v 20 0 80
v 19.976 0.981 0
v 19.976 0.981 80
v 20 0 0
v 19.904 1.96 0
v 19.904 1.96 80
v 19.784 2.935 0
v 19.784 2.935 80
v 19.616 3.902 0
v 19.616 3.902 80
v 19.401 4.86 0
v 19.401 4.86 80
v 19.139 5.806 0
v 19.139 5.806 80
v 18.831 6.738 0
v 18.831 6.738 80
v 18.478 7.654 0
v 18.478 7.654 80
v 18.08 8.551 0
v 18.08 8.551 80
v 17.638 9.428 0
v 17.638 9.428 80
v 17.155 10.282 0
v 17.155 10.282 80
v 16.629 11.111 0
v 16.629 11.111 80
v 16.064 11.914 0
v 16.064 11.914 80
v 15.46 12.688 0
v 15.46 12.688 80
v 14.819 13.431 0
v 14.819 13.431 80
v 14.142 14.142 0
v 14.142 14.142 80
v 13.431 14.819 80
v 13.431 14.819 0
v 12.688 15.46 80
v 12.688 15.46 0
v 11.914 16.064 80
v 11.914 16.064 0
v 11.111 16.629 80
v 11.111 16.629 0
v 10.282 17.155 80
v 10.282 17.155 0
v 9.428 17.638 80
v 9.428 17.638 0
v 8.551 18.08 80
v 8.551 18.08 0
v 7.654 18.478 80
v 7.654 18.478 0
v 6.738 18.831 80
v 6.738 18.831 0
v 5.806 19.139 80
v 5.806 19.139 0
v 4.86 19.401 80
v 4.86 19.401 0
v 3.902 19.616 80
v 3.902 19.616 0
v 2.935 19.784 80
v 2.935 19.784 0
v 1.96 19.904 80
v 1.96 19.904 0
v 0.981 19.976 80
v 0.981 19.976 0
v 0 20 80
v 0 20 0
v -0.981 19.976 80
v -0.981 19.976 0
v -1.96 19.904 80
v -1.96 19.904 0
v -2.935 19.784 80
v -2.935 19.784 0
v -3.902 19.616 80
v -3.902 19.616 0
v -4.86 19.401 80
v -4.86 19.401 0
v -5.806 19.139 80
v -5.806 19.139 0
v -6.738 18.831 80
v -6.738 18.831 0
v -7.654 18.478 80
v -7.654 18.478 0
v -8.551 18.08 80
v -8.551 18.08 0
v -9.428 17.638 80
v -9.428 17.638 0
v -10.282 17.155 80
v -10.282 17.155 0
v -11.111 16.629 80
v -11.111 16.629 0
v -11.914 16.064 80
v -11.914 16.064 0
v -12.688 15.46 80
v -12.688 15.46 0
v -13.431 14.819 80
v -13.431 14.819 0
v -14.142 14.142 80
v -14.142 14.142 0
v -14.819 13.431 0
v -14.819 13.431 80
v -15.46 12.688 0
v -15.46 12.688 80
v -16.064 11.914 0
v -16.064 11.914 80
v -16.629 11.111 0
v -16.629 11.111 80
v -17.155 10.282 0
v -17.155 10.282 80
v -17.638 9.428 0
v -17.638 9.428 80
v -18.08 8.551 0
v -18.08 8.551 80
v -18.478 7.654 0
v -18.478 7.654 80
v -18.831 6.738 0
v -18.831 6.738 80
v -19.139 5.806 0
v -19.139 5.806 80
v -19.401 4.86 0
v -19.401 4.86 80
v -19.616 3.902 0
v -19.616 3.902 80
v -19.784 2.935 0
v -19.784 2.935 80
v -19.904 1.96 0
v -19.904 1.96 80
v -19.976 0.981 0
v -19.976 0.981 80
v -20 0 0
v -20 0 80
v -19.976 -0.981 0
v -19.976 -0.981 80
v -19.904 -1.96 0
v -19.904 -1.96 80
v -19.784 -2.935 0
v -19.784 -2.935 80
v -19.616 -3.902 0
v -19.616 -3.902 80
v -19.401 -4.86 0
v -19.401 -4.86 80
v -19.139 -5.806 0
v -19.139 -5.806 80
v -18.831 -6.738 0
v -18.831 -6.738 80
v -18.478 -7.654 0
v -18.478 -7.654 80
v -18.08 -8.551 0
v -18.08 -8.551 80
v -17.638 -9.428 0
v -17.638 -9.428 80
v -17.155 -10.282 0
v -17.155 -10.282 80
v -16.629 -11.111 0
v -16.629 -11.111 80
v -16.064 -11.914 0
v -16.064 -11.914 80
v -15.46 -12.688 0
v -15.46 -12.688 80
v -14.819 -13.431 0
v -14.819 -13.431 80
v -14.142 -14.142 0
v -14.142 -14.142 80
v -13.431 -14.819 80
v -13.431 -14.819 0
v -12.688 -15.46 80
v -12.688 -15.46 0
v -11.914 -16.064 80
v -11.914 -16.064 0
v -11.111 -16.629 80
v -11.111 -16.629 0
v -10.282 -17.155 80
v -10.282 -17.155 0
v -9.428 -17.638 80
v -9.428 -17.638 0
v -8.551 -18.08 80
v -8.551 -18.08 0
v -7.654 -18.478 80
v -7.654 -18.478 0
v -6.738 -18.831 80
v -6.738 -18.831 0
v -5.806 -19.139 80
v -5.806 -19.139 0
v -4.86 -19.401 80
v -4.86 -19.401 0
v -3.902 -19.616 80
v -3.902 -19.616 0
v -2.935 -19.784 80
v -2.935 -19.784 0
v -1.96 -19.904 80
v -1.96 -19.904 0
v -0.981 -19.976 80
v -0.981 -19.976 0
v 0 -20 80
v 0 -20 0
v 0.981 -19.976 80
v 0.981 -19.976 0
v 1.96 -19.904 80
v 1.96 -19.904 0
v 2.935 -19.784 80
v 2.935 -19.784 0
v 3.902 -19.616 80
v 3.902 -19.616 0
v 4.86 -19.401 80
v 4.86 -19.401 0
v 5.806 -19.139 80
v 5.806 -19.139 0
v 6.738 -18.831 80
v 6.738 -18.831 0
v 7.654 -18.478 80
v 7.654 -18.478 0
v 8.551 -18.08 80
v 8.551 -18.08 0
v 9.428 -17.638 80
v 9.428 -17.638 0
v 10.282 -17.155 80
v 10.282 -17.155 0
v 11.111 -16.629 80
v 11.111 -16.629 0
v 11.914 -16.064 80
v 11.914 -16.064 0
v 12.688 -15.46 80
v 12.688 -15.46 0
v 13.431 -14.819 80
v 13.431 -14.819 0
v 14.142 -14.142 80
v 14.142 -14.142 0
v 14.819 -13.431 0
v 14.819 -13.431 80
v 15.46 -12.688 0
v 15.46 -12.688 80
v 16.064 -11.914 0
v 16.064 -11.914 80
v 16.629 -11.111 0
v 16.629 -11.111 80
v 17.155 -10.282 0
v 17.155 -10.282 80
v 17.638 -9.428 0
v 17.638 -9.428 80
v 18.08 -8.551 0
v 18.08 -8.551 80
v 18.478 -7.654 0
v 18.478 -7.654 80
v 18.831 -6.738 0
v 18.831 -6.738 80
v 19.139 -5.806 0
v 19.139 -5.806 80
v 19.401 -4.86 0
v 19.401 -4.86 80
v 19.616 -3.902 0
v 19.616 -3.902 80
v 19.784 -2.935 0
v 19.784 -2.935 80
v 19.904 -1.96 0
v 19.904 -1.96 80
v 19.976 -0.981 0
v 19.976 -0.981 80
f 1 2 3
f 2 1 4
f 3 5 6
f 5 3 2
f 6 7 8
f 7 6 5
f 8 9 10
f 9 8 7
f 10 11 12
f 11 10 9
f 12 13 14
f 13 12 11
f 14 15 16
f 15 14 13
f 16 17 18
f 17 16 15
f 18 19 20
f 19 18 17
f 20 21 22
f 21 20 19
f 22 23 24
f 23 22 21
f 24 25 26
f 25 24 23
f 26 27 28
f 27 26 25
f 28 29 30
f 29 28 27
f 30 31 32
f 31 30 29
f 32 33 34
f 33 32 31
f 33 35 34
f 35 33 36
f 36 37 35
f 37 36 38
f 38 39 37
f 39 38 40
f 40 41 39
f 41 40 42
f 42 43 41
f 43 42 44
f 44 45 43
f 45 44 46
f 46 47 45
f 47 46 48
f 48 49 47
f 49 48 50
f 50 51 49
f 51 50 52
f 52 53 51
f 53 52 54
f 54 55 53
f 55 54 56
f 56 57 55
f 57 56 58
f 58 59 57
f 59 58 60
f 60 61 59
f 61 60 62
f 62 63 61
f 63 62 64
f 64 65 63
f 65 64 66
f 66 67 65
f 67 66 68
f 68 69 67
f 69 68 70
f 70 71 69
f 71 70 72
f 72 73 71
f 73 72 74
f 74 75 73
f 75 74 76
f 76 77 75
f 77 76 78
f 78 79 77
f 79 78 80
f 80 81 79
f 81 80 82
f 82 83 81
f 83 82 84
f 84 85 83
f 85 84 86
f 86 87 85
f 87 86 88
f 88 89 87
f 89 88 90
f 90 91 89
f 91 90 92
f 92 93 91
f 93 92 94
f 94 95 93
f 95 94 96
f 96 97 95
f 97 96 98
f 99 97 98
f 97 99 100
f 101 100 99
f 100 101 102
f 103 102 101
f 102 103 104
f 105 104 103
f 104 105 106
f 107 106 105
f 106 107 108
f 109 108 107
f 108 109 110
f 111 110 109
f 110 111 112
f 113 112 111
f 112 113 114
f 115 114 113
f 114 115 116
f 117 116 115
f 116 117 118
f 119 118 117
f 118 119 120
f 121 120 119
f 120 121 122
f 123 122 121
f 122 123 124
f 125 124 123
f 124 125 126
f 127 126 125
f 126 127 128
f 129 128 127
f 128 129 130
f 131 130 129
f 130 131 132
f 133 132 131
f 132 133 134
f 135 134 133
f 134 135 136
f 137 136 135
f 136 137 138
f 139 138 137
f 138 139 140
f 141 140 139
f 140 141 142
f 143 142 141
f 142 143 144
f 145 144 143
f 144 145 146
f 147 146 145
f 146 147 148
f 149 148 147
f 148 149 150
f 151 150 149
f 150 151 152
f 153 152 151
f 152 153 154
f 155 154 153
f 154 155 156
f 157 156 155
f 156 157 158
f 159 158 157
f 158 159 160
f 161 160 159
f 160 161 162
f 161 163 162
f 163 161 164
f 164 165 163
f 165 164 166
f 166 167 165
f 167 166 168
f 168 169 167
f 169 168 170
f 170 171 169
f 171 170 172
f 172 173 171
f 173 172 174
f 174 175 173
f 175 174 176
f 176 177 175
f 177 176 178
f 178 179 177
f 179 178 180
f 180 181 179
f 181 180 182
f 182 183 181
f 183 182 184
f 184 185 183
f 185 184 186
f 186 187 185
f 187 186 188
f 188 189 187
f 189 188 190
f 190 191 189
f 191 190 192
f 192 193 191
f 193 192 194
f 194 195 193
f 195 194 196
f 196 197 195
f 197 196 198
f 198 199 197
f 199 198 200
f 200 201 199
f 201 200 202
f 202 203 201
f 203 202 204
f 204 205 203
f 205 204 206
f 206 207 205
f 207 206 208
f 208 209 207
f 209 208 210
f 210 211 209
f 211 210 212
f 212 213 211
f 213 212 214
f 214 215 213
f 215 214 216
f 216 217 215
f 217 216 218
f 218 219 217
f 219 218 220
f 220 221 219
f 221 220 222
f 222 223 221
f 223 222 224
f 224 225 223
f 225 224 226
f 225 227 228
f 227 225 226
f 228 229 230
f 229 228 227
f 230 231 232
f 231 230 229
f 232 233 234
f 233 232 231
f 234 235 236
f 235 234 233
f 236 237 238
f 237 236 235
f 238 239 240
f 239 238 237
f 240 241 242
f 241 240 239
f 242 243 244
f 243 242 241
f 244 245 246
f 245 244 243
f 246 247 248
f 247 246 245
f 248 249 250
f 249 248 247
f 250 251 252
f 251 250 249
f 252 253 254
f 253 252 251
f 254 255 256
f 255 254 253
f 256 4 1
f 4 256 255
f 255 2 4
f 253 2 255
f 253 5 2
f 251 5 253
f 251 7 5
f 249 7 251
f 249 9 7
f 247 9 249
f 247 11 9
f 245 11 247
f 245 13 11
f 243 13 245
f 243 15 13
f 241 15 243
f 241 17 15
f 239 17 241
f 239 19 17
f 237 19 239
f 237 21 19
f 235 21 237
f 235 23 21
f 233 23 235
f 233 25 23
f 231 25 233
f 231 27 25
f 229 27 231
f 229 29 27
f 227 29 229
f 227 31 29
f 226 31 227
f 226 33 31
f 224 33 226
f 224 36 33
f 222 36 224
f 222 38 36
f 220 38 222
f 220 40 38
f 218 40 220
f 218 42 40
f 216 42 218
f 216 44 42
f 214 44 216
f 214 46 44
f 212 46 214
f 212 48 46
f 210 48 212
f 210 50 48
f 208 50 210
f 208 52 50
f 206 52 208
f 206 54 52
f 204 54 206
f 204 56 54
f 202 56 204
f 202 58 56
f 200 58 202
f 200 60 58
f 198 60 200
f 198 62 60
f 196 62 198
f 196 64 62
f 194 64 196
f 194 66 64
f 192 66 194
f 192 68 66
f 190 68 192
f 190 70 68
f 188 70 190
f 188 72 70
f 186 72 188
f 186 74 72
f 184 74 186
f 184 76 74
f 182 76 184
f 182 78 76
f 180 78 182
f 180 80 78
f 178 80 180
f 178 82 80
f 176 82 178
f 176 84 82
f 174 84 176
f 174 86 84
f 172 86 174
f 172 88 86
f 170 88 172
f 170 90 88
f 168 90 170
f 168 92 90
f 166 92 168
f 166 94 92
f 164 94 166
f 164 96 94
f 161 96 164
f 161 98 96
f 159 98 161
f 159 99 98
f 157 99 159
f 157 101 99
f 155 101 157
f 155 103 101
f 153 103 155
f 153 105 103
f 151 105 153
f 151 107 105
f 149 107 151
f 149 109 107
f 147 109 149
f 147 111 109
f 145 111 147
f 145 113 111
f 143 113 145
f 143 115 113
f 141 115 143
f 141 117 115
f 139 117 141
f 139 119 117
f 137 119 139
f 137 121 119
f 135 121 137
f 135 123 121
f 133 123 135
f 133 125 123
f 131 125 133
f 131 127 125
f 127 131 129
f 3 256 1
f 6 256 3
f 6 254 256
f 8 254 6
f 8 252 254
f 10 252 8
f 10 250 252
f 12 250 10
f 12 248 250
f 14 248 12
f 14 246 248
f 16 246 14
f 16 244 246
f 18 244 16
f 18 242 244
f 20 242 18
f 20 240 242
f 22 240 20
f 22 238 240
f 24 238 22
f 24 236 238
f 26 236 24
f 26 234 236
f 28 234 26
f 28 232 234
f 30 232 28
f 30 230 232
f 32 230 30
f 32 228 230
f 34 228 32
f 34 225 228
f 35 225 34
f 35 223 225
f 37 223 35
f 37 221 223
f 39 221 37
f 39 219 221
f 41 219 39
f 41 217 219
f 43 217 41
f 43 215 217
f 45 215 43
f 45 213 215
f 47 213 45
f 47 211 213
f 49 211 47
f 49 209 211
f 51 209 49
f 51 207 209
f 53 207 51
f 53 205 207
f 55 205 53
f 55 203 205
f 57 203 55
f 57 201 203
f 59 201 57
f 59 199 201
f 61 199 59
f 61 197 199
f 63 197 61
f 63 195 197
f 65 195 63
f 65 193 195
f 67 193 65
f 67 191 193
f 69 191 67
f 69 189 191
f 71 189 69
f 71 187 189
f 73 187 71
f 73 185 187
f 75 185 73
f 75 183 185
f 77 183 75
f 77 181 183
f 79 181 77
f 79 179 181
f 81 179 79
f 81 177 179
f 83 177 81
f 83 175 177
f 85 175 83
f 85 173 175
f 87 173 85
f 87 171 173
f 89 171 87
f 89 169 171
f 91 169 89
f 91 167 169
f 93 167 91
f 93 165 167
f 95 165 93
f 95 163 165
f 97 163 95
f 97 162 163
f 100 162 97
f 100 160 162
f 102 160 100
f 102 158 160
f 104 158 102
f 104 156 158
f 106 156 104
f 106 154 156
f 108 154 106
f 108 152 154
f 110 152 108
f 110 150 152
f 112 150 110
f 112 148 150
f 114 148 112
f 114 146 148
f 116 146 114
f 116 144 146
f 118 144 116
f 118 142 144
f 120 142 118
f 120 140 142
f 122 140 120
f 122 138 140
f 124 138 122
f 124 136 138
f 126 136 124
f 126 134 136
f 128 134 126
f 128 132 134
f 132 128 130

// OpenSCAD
// Cylinder: 40 mm diameter, 80 mm height
// $fn controls the facet count for smoothness when exporting to STL
$fn = 128;

// Create cylinder (OpenSCAD uses millimeters by default)
// d = diameter, h = height
cylinder(h = 80, d = 40, center = false);
